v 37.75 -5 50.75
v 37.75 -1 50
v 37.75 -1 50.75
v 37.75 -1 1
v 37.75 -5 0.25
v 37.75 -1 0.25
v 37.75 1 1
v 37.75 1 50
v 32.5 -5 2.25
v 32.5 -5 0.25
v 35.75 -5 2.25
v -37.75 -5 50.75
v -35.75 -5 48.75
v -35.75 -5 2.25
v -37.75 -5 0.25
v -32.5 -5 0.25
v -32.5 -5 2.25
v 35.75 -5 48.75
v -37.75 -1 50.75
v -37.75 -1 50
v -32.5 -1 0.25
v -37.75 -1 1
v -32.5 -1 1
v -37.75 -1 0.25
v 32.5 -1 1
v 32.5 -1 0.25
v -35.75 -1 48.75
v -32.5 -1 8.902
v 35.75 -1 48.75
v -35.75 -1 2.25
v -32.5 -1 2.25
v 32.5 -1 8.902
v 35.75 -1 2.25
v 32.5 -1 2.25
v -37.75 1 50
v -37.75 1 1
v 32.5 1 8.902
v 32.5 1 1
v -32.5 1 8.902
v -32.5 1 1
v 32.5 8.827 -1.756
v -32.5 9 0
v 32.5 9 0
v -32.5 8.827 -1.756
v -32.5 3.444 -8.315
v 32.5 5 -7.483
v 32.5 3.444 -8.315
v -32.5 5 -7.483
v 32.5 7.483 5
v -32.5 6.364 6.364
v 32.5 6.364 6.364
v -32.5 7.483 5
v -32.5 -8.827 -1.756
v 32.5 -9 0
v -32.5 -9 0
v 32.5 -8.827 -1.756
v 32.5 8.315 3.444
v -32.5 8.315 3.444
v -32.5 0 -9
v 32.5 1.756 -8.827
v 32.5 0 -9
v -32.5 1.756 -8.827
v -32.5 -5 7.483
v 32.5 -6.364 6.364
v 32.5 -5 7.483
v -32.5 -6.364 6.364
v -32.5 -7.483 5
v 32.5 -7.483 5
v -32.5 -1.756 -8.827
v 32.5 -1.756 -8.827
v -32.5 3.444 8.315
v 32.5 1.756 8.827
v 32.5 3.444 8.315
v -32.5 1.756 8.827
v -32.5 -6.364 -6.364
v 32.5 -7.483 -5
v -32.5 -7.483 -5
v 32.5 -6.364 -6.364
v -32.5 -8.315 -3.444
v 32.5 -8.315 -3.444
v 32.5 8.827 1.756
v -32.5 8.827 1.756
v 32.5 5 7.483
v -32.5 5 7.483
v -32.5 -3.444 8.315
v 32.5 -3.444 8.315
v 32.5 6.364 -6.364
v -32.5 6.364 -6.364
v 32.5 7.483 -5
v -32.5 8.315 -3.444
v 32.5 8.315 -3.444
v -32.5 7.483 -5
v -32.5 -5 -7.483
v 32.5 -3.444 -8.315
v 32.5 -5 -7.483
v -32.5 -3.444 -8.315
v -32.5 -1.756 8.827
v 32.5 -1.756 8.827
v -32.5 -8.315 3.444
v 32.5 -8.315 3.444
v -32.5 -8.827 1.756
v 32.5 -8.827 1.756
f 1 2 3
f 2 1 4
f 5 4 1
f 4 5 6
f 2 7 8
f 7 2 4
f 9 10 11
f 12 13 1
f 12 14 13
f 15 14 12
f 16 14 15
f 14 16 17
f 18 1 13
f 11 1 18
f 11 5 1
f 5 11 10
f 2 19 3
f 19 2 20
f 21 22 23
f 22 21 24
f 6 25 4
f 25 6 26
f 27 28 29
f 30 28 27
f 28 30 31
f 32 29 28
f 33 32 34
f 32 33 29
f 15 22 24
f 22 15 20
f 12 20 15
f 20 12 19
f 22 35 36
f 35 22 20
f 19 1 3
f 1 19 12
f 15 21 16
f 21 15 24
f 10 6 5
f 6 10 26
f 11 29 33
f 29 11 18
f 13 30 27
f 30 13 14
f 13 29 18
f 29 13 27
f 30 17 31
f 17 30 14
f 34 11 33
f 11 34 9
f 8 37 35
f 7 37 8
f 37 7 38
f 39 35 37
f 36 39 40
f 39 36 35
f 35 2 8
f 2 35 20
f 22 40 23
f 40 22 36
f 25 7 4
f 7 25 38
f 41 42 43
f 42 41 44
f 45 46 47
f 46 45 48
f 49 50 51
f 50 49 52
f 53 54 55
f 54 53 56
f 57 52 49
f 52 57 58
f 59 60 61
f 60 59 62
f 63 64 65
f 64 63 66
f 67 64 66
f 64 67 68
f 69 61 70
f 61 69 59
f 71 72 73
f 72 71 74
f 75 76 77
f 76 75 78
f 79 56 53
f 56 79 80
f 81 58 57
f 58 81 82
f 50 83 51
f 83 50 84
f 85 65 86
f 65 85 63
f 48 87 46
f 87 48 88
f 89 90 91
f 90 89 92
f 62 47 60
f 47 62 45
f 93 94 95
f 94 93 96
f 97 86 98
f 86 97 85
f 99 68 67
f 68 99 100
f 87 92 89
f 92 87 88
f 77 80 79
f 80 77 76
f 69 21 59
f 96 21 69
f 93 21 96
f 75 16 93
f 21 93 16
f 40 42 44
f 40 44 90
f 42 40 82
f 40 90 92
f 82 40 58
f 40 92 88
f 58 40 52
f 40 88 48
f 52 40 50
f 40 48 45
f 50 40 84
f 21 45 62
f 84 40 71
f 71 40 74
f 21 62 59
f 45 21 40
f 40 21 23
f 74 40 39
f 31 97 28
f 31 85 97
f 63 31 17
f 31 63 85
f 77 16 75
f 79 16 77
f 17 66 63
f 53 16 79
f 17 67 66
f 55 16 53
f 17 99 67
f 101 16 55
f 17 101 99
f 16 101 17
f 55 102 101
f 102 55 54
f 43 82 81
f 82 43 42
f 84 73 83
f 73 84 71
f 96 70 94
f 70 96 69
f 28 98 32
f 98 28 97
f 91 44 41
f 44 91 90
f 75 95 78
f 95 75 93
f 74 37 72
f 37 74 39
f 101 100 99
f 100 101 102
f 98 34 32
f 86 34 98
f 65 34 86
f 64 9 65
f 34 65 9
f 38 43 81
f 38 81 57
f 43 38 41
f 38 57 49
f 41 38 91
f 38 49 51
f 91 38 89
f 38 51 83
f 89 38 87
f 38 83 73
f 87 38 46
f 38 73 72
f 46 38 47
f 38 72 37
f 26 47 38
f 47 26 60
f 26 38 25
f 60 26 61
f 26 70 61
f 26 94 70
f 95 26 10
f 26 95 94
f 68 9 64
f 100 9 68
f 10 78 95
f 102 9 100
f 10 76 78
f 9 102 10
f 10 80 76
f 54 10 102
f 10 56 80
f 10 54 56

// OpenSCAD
// file: akkum18650.scad
echo("Работа Арины Ивановой");

d_akkum = 18;
h_akkum = 65;

twoAcc();

module twoAcc() {
translate([0, -d_akkum/2-1, d_akkum/2+1])
rotate([0, 90, 0])
akkum18650();
    
translate([0, d_akkum/2+1, d_akkum/2+1])
rotate([0, 90, 0])
akkum18650();
    
translate([-33, -10, 0])
import("flexbatter18650x2.stl");
}

module akkum18650(){
    color("purple")
    cylinder(d=d_akkum, h=h_akkum, $fn=32, center = true);
}
// main file
use <akkum18650.scad>

echo("Работа Арины Ивановой");


d_akkum = 18;
h_akkium = 65;


thickness_frame = 4;
thickness_walls = 2;
thickness_bottom = 2;

w_back = 70;
h_back = 45;
thickness_back = 1;
h_walls = 4;
gap_backlight = 1.5;

//rotate([90, 0, 0])
//translate([0,0,4])
//backlight();
//kit_frame();
//akkum18650();
build_frame();

module build_frame(){
    translate([0, 0, h_back/2+2*gap_backlight])
    rotate([90, 0, 0])
    kit_frame();
    translate([0, 0, d_akkum/2+thickness_back, d_akkum/2])
    rotate([0,90,0])
    akkum18650();
    }

module kit_frame(){
    bottom();
    translate([0,0,h_walls/2+thickness_bottom/2])
    walls();
}
module walls(){
    difference(){
        cube([w_back+2*thickness_walls+gap_backlight, h_back+2*thickness_walls+gap_backlight, h_walls], center = true);
        color("red")
        cube([w_back+gap_backlight, h_back+gap_backlight, h_walls+1], center = true);
    }
}
module backlight(){
    color("lightgreen")
    cube([w_back, h_back, thickness_back], center = true);
}



module bottom(){
    cube([w_back+2*thickness_walls+gap_backlight, h_back+2*thickness_walls, thickness_bottom], center = true);
}
